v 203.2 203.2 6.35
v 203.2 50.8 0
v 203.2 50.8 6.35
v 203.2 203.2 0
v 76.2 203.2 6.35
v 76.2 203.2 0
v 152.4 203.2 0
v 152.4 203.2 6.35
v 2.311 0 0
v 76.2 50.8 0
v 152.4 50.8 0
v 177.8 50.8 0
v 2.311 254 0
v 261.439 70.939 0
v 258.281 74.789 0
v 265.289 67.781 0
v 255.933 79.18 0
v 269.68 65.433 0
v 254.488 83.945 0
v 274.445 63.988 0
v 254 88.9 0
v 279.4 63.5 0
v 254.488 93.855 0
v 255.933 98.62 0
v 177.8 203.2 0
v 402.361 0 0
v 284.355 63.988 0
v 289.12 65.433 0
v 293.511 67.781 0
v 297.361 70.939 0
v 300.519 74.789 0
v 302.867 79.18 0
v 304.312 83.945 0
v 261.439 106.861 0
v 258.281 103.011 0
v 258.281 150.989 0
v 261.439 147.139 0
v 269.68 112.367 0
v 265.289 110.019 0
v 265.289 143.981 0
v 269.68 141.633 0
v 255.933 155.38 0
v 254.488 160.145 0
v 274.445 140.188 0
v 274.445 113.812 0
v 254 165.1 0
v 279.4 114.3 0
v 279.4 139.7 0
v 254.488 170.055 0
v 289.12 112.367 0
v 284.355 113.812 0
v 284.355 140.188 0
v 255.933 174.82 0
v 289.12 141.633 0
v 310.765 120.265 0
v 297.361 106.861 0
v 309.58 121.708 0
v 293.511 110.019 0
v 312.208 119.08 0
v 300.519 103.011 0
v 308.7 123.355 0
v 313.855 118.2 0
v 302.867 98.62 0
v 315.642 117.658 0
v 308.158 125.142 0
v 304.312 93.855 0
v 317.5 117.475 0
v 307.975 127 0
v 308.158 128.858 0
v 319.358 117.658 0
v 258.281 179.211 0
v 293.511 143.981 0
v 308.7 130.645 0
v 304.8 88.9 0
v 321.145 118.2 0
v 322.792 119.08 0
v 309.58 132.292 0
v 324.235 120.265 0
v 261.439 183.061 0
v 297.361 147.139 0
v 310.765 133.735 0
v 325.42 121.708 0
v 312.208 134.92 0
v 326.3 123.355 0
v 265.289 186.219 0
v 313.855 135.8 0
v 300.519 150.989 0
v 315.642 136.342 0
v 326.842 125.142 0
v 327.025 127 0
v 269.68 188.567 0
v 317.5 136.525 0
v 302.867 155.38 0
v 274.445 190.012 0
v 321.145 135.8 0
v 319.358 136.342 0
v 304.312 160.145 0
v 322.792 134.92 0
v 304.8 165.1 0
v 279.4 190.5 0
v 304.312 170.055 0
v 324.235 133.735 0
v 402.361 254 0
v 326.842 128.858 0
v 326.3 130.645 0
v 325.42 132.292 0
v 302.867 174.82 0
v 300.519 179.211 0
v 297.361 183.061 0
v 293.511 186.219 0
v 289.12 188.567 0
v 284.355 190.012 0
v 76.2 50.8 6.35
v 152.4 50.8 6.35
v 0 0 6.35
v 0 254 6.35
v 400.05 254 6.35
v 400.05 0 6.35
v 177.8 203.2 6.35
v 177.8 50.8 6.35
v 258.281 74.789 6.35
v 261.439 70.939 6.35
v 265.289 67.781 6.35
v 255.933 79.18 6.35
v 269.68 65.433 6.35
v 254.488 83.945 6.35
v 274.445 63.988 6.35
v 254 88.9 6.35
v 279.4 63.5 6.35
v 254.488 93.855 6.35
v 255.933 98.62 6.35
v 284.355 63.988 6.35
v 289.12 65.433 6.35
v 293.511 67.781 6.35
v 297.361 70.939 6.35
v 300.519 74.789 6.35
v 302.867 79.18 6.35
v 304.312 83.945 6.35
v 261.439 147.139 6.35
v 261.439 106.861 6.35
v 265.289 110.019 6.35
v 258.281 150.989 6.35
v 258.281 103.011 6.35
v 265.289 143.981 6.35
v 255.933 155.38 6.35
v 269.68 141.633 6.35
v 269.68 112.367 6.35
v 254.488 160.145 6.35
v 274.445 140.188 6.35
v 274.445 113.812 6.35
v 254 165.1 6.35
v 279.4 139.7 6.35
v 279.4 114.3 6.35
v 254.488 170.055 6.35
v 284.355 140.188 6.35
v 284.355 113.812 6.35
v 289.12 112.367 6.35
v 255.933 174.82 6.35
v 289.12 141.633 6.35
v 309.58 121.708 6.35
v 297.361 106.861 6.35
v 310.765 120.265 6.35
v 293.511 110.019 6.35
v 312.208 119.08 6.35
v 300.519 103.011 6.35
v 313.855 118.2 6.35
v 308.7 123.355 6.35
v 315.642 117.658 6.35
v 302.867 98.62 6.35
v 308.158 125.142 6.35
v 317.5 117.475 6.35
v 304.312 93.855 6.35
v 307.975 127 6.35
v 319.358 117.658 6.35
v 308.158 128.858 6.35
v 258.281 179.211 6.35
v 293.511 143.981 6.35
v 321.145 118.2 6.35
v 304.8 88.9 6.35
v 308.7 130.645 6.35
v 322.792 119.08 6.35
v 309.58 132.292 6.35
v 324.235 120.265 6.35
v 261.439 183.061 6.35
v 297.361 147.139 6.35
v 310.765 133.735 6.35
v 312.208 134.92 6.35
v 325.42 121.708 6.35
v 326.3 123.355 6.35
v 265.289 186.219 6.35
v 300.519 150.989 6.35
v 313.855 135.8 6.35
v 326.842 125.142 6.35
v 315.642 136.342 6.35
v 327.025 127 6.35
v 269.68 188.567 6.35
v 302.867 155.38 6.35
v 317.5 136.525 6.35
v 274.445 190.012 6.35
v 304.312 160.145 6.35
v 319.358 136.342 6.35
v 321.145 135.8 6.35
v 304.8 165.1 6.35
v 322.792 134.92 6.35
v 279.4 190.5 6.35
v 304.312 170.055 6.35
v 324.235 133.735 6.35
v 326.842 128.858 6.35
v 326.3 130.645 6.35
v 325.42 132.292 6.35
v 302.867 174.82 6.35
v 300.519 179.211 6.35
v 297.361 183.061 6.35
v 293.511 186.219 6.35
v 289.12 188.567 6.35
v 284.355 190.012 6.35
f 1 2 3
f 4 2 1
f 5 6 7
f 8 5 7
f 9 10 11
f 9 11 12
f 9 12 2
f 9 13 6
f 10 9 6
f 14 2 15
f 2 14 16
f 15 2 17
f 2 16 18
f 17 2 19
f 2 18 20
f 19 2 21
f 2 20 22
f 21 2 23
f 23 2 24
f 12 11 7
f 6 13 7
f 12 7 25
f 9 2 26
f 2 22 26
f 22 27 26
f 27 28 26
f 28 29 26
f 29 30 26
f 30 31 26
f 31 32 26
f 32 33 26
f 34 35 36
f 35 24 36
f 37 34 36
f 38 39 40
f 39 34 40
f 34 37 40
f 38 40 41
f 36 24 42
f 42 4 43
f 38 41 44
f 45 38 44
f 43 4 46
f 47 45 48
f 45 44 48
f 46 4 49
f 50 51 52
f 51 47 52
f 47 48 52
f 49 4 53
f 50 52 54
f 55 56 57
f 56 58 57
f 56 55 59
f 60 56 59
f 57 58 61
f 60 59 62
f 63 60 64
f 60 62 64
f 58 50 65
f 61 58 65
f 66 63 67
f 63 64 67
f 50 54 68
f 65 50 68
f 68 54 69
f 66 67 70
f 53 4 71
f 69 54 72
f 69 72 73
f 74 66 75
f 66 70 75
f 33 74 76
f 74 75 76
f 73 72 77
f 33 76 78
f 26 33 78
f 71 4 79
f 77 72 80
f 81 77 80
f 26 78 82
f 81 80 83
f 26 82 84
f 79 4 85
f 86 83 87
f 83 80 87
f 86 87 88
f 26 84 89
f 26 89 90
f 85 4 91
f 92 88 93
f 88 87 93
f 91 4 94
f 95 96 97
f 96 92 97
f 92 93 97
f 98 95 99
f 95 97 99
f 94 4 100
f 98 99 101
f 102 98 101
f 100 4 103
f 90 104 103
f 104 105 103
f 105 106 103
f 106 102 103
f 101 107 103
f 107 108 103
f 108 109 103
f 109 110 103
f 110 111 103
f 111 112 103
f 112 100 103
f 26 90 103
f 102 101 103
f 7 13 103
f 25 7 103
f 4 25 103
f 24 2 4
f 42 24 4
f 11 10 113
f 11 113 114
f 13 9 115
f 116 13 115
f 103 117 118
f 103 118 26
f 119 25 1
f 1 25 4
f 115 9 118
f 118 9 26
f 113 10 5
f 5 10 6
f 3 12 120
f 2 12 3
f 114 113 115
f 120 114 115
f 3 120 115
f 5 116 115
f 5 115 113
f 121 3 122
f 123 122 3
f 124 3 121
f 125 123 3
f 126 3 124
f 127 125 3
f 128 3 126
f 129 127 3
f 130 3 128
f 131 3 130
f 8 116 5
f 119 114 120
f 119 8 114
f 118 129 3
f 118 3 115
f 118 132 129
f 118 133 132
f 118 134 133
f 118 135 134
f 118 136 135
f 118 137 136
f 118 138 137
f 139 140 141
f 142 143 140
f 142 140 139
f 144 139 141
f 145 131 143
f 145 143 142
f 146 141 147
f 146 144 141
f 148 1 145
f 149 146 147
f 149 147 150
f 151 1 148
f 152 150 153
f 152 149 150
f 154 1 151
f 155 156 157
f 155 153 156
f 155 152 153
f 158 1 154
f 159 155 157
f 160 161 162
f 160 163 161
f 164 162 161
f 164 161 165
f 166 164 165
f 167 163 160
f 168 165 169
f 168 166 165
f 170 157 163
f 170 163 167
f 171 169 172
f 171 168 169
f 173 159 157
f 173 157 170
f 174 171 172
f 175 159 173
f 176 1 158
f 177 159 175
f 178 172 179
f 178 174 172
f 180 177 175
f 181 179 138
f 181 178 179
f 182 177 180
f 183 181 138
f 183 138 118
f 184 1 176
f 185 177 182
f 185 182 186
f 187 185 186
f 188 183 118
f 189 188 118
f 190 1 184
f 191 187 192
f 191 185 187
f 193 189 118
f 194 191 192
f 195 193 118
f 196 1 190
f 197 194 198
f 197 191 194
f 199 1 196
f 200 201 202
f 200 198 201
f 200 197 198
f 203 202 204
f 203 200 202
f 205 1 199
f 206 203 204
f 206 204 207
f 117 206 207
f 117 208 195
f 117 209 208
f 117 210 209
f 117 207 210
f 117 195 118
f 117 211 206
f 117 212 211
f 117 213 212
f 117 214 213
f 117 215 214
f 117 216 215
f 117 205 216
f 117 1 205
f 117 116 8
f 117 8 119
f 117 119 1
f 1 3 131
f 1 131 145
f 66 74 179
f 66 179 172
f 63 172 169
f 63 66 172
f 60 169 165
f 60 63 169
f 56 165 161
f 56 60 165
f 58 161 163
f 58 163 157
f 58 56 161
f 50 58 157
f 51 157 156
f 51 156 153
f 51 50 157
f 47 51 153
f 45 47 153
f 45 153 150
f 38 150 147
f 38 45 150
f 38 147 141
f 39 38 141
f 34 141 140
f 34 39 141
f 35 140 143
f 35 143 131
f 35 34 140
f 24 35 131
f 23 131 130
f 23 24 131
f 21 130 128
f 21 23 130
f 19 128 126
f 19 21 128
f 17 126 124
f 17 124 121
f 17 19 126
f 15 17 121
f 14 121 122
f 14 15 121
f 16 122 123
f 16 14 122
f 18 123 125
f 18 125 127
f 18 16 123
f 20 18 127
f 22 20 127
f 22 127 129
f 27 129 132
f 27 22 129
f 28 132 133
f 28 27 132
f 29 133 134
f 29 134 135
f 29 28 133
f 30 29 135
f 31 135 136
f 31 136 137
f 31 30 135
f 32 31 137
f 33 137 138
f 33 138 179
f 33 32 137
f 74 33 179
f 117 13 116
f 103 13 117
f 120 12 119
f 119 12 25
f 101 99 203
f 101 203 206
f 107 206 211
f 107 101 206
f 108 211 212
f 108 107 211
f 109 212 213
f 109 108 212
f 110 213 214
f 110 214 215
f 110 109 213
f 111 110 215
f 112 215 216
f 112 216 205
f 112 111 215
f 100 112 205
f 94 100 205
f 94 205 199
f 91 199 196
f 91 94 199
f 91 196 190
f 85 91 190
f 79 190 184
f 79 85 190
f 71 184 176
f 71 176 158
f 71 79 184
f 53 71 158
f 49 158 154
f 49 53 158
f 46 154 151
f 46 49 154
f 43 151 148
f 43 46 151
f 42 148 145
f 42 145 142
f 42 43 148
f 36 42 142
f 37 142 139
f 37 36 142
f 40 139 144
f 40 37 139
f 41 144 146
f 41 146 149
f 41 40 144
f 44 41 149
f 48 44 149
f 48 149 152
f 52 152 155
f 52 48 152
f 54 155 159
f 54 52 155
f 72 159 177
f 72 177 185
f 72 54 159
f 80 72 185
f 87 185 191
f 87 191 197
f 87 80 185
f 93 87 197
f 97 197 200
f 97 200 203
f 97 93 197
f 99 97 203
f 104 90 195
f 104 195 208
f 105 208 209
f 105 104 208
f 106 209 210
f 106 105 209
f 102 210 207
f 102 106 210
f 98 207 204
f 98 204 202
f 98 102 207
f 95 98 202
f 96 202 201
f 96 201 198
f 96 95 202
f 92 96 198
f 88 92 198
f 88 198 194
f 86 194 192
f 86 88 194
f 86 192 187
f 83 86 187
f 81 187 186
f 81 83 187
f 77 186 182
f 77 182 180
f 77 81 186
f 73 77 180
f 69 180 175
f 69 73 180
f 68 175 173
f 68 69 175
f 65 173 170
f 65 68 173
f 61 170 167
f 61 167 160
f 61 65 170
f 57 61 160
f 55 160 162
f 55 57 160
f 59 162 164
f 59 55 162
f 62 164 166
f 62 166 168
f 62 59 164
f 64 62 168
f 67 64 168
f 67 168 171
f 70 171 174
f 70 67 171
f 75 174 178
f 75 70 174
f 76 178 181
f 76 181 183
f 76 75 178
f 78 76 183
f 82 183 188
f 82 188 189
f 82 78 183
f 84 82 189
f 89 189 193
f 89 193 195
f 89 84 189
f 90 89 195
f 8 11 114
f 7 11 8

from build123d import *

# Parameters (mm, degrees)
F0_W     = 406.4
F0_H     = 254
F0_R     = 25.4
F0_W_2   = 76.2
F0_H_2   = 152.4
F0_W_3   = 25.4
F0_R_2   = 9.525
F1_DEPTH = 6.35
F3_DEPTH = 254.001
F5_DEPTH = 254.001


with BuildPart() as f1:
    # F0 (on Top) → F1 (new body)
    with BuildSketch(Plane.XY):
        with Locations((203.2, 127)):
            Rectangle(F0_W, F0_H)
        with Locations((279.4, 88.9)):
            Circle(F0_R, mode=Mode.SUBTRACT)
        with Locations((114.3, 127)):
            Rectangle(F0_W_2, F0_H_2, mode=Mode.SUBTRACT)
        with Locations((190.5, 127)):
            Rectangle(F0_W_3, F0_H_2, mode=Mode.SUBTRACT)
        with Locations((279.4, 165.1)):
            Circle(F0_R, mode=Mode.SUBTRACT)
        with Locations((317.5, 127)):
            Circle(F0_R_2, mode=Mode.SUBTRACT)
    extrude(amount=F1_DEPTH)

    # F2 (on face) → F3 (cut, through all)
    with BuildSketch(Plane.XZ):
        Polygon((2.3112109876, 0), (0, 6.35), (0, 0), align=None)
    extrude(amount=-F3_DEPTH, mode=Mode.SUBTRACT)

    # F4 (on face) → F5 (cut, through all)
    with BuildSketch(Plane.XZ):
        Polygon((400.05, 6.35), (402.3612109876, 0), (406.4, 0), (406.4, 6.35), align=None)
        Polygon((396.6623240103, 15.657563286), (400.05, 6.35), (406.4, 6.35), (406.4, 0), (417.733579874, 0), (417.733579874, 15.657563286), align=None)
    extrude(amount=-F5_DEPTH, mode=Mode.SUBTRACT)


solid = f1.part
